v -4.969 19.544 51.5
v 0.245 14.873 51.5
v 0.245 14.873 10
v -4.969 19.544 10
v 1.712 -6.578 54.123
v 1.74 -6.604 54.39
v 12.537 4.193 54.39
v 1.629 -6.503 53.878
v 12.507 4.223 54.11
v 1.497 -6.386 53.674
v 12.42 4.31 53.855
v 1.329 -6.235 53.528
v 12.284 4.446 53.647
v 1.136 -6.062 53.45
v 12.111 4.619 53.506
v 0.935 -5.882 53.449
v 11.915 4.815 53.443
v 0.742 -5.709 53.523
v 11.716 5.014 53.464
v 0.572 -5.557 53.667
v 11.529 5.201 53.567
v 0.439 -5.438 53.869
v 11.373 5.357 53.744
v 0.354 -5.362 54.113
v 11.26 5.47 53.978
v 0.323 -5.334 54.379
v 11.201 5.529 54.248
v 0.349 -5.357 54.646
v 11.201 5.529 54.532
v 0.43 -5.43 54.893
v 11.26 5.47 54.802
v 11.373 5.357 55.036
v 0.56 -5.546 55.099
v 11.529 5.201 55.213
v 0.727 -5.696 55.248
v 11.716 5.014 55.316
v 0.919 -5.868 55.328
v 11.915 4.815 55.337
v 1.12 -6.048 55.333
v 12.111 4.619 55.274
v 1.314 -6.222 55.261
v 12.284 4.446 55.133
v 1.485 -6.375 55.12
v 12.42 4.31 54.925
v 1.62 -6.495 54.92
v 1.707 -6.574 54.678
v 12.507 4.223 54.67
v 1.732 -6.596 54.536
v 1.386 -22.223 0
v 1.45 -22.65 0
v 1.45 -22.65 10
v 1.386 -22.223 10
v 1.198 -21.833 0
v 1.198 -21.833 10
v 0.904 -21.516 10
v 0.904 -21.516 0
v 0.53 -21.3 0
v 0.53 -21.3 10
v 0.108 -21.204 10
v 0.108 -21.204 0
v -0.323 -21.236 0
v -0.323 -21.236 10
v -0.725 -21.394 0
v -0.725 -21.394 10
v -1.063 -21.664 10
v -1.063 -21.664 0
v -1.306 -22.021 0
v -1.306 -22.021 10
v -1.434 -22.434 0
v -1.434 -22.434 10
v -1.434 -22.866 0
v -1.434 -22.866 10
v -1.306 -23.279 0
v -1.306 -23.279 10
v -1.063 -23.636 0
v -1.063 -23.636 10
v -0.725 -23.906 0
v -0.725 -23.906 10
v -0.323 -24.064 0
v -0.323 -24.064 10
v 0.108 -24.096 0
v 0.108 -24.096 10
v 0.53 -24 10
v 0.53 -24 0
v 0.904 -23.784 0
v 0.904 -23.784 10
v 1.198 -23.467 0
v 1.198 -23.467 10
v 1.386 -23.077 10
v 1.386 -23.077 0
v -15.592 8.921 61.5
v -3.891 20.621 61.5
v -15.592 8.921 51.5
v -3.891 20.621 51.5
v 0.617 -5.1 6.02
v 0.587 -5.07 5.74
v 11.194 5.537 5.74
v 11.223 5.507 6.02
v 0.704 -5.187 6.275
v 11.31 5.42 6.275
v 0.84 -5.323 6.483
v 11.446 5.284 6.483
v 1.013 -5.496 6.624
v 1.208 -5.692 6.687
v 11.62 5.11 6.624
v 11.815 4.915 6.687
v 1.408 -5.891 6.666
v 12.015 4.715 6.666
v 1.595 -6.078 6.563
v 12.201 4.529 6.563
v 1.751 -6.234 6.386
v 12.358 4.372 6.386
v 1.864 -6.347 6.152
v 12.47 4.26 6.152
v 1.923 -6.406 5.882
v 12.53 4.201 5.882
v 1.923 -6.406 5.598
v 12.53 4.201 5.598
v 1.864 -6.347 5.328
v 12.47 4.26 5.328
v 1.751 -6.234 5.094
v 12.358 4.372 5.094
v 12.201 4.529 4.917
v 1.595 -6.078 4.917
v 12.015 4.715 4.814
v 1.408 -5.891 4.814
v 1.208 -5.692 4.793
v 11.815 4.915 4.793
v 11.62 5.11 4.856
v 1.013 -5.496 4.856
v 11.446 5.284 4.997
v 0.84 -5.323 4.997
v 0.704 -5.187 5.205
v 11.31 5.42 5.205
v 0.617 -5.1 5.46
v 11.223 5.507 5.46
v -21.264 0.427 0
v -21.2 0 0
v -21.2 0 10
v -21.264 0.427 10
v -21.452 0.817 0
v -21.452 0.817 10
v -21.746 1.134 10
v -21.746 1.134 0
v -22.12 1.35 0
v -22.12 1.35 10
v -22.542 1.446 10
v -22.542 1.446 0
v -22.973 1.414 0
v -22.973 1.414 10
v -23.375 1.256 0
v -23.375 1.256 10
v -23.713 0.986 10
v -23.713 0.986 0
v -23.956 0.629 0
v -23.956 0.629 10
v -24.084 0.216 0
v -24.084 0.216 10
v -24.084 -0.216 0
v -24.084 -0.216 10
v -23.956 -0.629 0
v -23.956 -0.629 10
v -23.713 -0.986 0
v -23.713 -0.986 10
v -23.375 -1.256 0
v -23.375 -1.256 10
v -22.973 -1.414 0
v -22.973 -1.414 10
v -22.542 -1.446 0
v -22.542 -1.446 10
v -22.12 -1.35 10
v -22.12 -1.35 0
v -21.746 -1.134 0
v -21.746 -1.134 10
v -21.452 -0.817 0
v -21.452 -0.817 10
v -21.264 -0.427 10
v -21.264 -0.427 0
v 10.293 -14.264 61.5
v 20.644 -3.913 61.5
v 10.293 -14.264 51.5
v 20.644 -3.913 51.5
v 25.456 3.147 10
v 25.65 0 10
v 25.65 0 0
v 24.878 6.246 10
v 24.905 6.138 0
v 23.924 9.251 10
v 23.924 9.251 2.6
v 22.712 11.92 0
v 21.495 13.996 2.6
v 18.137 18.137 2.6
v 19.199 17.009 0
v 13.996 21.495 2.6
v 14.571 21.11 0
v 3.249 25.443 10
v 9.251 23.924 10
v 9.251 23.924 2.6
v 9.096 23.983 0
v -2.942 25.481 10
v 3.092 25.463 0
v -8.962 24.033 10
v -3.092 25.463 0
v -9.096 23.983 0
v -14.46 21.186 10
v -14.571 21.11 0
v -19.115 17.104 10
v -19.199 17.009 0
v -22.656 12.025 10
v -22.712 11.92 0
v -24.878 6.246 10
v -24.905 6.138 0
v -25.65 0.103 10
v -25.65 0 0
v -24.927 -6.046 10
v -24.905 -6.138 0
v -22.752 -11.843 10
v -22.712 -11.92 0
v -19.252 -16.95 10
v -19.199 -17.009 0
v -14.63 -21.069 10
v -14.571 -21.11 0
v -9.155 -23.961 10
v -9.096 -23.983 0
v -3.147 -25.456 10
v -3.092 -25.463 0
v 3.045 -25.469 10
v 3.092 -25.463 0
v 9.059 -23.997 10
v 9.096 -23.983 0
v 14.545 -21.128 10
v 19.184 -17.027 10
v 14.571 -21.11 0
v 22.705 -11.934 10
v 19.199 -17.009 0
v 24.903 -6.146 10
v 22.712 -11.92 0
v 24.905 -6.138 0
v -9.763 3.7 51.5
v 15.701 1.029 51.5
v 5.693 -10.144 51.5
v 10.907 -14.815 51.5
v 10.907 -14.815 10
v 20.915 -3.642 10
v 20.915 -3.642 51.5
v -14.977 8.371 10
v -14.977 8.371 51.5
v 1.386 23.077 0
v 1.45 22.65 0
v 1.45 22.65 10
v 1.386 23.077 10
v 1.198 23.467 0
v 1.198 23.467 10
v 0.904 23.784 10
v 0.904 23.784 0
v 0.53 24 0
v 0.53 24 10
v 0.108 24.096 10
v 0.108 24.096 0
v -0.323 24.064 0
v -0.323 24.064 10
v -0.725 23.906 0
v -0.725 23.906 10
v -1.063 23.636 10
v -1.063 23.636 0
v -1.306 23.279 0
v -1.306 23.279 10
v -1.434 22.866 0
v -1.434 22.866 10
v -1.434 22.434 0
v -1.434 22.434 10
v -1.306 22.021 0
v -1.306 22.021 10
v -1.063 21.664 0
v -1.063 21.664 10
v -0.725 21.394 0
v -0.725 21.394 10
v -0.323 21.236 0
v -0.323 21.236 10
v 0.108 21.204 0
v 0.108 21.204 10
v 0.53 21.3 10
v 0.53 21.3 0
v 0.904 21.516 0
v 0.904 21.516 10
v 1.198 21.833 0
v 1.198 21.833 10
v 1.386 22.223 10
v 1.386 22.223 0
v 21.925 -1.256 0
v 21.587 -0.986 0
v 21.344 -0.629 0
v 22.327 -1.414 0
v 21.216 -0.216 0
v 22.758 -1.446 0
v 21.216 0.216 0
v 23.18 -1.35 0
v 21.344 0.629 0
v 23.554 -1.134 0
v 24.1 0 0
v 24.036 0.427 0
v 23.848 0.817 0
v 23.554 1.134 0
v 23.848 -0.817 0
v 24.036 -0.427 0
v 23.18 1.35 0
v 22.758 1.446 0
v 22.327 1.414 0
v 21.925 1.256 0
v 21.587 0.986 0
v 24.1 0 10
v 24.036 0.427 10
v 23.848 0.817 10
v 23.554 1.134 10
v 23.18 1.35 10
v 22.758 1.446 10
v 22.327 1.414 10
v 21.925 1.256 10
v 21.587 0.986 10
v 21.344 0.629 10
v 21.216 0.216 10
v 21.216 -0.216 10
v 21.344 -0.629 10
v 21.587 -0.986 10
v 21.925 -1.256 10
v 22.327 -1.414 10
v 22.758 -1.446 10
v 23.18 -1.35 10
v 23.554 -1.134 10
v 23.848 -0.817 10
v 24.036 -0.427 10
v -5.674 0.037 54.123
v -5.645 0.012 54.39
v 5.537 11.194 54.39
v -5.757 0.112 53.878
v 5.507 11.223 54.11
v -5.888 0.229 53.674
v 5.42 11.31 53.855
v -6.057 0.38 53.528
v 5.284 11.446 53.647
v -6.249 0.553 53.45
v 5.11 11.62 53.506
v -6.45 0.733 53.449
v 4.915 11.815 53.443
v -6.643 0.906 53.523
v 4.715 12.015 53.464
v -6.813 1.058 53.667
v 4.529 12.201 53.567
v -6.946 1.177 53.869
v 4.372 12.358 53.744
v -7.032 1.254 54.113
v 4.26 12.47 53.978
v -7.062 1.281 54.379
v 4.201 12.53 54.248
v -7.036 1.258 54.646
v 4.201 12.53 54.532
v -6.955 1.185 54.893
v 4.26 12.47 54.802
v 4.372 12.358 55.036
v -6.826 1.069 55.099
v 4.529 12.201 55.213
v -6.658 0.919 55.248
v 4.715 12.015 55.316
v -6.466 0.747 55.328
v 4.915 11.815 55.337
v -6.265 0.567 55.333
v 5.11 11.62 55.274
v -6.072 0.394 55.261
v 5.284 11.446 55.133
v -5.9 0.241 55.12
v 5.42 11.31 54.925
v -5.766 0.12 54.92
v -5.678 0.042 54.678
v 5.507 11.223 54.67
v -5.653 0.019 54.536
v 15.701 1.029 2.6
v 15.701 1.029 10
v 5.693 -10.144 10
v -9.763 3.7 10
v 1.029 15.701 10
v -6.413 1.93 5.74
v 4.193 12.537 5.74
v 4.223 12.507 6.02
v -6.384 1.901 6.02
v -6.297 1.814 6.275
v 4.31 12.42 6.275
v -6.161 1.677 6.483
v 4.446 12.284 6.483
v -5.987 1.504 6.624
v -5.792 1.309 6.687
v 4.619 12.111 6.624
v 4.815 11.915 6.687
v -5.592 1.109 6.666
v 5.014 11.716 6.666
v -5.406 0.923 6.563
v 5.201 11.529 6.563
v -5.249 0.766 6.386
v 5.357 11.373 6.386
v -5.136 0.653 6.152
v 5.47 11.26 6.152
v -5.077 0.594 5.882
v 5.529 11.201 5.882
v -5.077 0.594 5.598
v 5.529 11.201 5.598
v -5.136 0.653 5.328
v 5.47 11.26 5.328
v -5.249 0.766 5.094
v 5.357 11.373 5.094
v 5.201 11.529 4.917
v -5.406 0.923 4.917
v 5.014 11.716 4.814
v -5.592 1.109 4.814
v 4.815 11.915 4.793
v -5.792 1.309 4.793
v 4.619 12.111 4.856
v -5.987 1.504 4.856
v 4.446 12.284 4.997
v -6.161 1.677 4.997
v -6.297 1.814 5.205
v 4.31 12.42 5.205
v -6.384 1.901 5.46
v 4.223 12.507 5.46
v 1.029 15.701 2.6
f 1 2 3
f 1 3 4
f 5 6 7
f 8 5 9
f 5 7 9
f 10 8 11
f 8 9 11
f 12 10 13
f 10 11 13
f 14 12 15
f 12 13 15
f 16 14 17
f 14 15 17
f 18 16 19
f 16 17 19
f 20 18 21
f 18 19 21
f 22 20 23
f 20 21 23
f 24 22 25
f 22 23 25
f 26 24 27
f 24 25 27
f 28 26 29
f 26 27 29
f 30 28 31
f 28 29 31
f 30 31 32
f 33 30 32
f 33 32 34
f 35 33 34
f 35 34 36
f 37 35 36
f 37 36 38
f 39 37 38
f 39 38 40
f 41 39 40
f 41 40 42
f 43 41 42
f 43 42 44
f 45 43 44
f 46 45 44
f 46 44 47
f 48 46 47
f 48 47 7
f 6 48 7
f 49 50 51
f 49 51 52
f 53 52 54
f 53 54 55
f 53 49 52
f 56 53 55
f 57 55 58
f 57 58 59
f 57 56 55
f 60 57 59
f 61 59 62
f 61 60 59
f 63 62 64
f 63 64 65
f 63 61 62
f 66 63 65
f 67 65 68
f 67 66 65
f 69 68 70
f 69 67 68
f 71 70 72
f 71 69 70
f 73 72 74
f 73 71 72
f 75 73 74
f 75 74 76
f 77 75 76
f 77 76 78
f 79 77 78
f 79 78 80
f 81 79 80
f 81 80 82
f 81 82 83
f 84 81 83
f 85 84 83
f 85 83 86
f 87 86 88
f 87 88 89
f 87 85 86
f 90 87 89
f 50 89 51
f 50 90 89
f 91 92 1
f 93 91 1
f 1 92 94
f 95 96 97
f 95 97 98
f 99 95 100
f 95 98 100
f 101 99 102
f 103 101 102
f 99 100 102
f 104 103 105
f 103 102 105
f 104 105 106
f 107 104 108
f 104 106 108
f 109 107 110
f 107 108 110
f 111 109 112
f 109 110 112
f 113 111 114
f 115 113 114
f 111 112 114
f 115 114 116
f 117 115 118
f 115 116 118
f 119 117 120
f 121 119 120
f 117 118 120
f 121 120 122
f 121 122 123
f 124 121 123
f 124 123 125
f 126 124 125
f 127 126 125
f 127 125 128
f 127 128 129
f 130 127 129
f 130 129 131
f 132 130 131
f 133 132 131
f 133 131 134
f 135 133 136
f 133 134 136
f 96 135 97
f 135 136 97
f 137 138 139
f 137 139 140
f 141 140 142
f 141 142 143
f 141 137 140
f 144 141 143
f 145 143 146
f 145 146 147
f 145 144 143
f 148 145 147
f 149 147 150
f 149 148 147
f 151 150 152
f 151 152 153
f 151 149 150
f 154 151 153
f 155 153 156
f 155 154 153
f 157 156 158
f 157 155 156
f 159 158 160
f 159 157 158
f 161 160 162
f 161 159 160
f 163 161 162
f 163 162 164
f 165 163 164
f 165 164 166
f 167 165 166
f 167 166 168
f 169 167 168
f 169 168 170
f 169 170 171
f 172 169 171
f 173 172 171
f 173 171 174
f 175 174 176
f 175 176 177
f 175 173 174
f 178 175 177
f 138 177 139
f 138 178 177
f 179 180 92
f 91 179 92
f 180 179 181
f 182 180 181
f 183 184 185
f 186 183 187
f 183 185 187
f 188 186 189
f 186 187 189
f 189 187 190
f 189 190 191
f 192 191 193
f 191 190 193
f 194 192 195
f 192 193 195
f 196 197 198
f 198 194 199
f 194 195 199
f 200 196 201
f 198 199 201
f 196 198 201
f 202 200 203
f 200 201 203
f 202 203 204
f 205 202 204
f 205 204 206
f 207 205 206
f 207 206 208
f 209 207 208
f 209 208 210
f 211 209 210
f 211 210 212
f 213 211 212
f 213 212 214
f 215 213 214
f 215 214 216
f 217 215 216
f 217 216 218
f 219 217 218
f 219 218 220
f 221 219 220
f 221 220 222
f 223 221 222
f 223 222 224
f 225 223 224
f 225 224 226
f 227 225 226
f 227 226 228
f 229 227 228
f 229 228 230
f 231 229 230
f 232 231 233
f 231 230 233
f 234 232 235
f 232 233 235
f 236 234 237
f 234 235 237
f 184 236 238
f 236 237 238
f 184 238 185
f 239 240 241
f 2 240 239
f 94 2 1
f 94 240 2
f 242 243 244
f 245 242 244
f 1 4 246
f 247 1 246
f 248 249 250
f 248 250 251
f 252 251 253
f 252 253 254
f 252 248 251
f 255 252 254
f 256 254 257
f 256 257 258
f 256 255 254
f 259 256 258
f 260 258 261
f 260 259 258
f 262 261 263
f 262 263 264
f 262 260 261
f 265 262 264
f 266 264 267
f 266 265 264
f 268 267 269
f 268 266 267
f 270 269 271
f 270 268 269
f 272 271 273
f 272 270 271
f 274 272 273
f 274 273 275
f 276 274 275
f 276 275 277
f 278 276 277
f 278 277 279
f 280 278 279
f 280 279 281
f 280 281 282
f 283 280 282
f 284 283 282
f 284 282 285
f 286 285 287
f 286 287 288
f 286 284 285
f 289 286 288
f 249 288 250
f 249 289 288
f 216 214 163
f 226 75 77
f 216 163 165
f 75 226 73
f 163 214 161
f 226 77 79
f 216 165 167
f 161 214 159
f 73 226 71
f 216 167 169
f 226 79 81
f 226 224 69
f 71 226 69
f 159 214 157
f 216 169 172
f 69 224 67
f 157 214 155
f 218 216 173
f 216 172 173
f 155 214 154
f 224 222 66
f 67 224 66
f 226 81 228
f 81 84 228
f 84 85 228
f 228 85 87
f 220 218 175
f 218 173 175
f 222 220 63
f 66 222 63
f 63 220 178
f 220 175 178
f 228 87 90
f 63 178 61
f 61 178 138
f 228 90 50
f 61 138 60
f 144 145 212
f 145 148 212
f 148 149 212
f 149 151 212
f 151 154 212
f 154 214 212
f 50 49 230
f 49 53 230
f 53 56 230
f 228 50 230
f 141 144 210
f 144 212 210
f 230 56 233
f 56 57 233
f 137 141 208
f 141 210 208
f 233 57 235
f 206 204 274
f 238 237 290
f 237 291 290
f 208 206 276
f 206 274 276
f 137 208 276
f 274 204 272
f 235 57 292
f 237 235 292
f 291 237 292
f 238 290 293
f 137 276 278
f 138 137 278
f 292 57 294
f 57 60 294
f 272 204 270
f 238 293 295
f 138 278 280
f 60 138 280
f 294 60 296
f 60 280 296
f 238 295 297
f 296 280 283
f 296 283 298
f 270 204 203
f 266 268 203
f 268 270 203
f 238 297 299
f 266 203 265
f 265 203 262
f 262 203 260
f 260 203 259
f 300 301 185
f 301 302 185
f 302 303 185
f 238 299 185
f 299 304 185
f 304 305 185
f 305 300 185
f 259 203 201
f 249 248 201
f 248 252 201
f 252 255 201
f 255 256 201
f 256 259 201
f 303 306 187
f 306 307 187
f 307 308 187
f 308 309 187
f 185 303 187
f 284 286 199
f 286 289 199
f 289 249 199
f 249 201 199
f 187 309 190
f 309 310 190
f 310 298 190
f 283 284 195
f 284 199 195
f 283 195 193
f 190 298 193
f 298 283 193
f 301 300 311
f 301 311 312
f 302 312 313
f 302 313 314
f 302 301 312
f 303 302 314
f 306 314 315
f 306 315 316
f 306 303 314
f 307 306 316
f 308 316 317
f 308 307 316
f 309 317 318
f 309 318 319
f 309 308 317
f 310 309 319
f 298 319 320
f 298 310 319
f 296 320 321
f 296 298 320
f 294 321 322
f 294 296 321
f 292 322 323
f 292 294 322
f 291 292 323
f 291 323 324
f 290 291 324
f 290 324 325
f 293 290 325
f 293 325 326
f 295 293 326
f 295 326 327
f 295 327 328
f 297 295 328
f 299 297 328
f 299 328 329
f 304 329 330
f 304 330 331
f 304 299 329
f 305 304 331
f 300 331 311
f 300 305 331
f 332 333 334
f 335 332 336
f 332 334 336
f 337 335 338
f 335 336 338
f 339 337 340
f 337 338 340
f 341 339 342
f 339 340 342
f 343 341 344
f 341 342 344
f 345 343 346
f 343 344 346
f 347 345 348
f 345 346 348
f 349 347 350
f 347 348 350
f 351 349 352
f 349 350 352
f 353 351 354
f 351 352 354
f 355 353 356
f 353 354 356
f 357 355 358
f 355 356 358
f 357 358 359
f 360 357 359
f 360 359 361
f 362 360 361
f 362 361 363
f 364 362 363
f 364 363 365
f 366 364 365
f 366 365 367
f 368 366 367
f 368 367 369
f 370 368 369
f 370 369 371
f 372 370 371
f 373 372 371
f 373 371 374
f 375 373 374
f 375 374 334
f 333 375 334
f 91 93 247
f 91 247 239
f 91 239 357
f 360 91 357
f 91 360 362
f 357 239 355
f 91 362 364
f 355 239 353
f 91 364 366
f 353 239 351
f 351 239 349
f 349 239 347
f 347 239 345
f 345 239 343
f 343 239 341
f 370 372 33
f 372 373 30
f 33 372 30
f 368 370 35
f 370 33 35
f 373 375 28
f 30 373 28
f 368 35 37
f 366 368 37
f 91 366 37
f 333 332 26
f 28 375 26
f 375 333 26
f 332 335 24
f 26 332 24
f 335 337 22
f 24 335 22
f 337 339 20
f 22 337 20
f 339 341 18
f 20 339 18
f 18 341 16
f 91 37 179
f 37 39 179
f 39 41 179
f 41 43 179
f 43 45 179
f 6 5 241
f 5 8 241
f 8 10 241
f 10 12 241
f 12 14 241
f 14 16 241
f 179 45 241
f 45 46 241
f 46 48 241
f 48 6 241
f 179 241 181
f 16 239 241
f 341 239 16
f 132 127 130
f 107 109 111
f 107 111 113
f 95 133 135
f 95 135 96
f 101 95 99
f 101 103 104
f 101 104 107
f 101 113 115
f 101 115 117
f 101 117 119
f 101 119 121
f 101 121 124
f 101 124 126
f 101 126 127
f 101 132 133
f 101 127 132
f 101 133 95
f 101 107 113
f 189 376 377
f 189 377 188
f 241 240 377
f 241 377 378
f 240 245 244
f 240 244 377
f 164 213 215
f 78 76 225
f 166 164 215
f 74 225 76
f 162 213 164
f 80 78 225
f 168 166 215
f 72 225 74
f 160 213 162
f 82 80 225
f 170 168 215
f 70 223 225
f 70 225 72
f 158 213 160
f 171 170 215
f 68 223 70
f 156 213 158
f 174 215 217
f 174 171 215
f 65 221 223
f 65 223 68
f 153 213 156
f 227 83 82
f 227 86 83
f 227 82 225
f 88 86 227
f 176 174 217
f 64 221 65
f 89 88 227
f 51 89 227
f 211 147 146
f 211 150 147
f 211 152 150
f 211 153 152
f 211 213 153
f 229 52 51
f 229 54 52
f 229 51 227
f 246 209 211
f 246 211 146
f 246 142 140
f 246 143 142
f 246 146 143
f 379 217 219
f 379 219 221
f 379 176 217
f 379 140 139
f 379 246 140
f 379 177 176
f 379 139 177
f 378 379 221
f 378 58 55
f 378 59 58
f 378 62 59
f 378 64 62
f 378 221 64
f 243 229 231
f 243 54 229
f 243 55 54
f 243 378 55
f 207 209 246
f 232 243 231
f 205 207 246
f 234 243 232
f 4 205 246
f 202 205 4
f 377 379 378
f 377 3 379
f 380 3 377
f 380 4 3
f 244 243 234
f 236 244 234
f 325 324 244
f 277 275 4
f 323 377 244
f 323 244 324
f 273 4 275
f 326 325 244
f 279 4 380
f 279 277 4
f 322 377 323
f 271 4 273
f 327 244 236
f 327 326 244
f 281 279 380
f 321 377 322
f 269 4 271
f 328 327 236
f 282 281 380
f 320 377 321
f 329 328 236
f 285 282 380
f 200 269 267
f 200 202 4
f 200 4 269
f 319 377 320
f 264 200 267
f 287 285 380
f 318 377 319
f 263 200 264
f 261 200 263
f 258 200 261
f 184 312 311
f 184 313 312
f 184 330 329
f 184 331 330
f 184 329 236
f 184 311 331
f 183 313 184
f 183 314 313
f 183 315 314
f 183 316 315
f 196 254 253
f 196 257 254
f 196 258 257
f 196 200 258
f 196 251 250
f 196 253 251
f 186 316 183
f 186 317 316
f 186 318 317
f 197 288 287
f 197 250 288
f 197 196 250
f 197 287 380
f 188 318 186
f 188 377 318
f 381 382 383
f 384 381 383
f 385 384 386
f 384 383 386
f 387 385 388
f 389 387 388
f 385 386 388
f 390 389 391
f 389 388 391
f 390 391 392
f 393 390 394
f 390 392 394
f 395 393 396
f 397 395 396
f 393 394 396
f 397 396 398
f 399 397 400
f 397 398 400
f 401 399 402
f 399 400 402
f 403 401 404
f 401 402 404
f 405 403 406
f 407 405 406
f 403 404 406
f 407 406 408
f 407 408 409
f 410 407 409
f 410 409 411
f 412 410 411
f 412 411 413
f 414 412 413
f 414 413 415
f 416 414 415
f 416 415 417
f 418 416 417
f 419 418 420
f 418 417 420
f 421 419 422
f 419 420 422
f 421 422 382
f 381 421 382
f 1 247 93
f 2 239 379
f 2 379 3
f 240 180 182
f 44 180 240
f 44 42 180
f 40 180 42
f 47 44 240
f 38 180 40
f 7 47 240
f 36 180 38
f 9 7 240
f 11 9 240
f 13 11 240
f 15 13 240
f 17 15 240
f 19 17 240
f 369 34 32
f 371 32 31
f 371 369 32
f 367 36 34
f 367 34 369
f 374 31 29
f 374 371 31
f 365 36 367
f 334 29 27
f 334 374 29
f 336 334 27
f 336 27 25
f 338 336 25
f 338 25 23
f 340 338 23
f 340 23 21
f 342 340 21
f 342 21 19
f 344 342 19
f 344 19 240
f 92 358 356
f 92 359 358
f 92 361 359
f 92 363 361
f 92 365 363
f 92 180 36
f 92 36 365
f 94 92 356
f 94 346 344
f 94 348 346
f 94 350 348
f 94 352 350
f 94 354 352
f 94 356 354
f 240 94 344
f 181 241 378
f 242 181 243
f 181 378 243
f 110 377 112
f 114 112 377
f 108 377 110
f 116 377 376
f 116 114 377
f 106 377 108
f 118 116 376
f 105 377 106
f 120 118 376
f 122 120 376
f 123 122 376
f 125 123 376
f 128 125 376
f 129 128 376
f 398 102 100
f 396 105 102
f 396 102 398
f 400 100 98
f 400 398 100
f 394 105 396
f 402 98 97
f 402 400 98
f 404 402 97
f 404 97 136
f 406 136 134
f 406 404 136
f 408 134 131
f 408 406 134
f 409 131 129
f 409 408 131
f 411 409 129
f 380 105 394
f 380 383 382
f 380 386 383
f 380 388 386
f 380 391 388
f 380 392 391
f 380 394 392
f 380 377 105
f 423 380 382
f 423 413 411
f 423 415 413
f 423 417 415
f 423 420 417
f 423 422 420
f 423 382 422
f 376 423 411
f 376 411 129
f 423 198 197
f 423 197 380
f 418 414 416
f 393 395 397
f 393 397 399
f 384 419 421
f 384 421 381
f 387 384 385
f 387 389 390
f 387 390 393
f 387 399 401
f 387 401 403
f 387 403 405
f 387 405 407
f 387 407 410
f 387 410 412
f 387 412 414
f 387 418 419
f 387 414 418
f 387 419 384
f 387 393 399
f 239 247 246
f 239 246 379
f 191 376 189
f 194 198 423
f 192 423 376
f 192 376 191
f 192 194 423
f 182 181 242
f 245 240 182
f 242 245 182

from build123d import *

# Parameters (mm, degrees)
SKETCH1_R               = 25.65
SKETCH1_R_2             = 1.45
BOSS_EXTRUDE1_DEPTH     = 10
CUT_EXTRUDE2_DEPTH      = 38.627715849
CUT_EXTRUDE2_DEPTH_BACK = 7.4
SKETCH3_R               = 0.95
CUT_EXTRUDE3_DEPTH      = 10
BOSS_EXTRUDE2_DEPTH     = 41.5
BOSS_EXTRUDE3_REACH     = 72.472
SKETCH7_R               = 0.95
SKETCH7_W               = 10
SKETCH7_H               = 34.697559569
SKETCH11_R              = 0.95
CUT_EXTRUDE4_DEPTH      = 15


with BuildPart() as part:
    # Sketch1 → Boss-Extrude1 (new body)
    with BuildSketch(Plane.XY):
        Circle(SKETCH1_R)
        with Locations((0, -22.65)):
            Circle(SKETCH1_R_2, mode=Mode.SUBTRACT)
        with Locations((22.65, 0)):
            Circle(SKETCH1_R_2, mode=Mode.SUBTRACT)
        with Locations((0, 22.65)):
            Circle(SKETCH1_R_2, mode=Mode.SUBTRACT)
        with Locations((-22.65, 0)):
            Circle(SKETCH1_R_2, mode=Mode.SUBTRACT)
    extrude(amount=BOSS_EXTRUDE1_DEPTH)

    # Sketch2 → Cut-Extrude2 (cut, two sides: drawn at the far end of the back side and taken through both)
    with BuildSketch(Plane.XY.offset(10).offset(-CUT_EXTRUDE2_DEPTH_BACK)):
        Polygon((102.061719716, 116.734185426), (9.251139978, 23.923605688), (1.028840367, 15.701306076), (15.701306076, 1.028840367), (23.923605688, 9.251139978), (116.734185426, 102.061719716), (302.355344902, 287.682879192), (287.682879192, 302.355344902), align=None)
    extrude(amount=CUT_EXTRUDE2_DEPTH + CUT_EXTRUDE2_DEPTH_BACK, mode=Mode.SUBTRACT)

    # Sketch3 → Cut-Extrude3 (cut)
    with BuildSketch(Plane(origin=(8.365073221, 8.365073221, 0), x_dir=(0, 0, -1), z_dir=(0.7071067811865477, 0.7071067811865475, 0))):
        with Locations(Location((-5.74, 4.95, 0), (0, 0, 90))):
            Circle(SKETCH3_R)
        with Locations(Location((-5.74, -4.95, 0), (0, 0, 270))):
            Circle(SKETCH3_R)
    extrude(amount=-CUT_EXTRUDE3_DEPTH, mode=Mode.SUBTRACT)

    # Sketch5 → Boss-Extrude2 (add)
    with BuildSketch(Plane.XY.offset(10)):
        Polygon((15.701306076, 1.028840367), (5.693193293, -10.144237926), (10.907296496, -14.814690558), (20.915409279, -3.641612265), align=None)
        Polygon((0.245214439, 14.873396383), (-4.968888764, 19.543849015), (-14.977001547, 8.370770723), (-9.762898344, 3.700318091), align=None)
    extrude(amount=BOSS_EXTRUDE2_DEPTH)

    # Boss-Extrude3: up to this plane
    boss_extrude3_end = Plane(origin=(5.693193293, -10.144237926, 51.5), z_dir=(0.6672075188676077, 0.7448718861432019, 0))
    # Sketch7 → Boss-Extrude3 (add, up to the surface)
    with BuildSketch(Plane(origin=(8.365073221, 8.365073221, 0), x_dir=(0, 0, -1), z_dir=(0.7071067811865477, 0.7071067811865475, 0)), mode=Mode.PRIVATE) as boss_extrude3_sk1:
        with Locations((-5.74, -4.95)):
            Circle(SKETCH7_R)
    boss_extrude3_tool1 = split(extrude(boss_extrude3_sk1.sketch, amount=-BOSS_EXTRUDE3_REACH, mode=Mode.PRIVATE), bisect_by=boss_extrude3_end, keep=Keep.BOTH, mode=Mode.PRIVATE)
    add(boss_extrude3_tool1.solids().sort_by_distance((11.865252, 4.864895, 5.74))[0])
    # Sketch7 → Boss-Extrude3 (add, up to the surface)
    with BuildSketch(Plane(origin=(8.365073221, 8.365073221, 0), x_dir=(0, 0, -1), z_dir=(0.7071067811865477, 0.7071067811865475, 0)), mode=Mode.PRIVATE) as boss_extrude3_sk2:
        with Locations((-5.74, 4.95)):
            Circle(SKETCH7_R)
    boss_extrude3_tool2 = split(extrude(boss_extrude3_sk2.sketch, amount=-BOSS_EXTRUDE3_REACH, mode=Mode.PRIVATE), bisect_by=boss_extrude3_end, keep=Keep.BOTH, mode=Mode.PRIVATE)
    add(boss_extrude3_tool2.solids().sort_by_distance((4.864895, 11.865252, 5.74))[0])
    # Sketch7 → Boss-Extrude3 (add, up to the surface)
    with BuildSketch(Plane(origin=(8.365073221, 8.365073221, 0), x_dir=(0, 0, -1), z_dir=(0.7071067811865477, 0.7071067811865475, 0)), mode=Mode.PRIVATE) as boss_extrude3_sk3:
        with Locations((-56.5, -0.015656675)):
            Rectangle(SKETCH7_W, SKETCH7_H)
        with Locations(Location((-54.39, -4.95, 0), (0, 0, 270))):
            Circle(SKETCH7_R, mode=Mode.SUBTRACT)
        with Locations(Location((-54.39, 4.95, 0), (0, 0, 270))):
            Circle(SKETCH7_R, mode=Mode.SUBTRACT)
    boss_extrude3_tool3 = split(extrude(boss_extrude3_sk3.sketch, amount=-BOSS_EXTRUDE3_REACH, mode=Mode.PRIVATE), bisect_by=boss_extrude3_end, keep=Keep.BOTH, mode=Mode.PRIVATE)
    add(boss_extrude3_tool3.solids().sort_by_distance((8.376328, 8.353818, 56.535056))[0])

    # Sketch11 → Cut-Extrude4 (cut)
    with BuildSketch(Plane(origin=(8.365073221, 8.365073221, 0), x_dir=(0, 0, -1), z_dir=(0.7071067811865477, 0.7071067811865475, 0))):
        with Locations(Location((-5.74, -4.95, 0), (0, 0, 90))):
            Circle(SKETCH11_R)
        with Locations(Location((-5.74, 4.95, 0), (0, 0, 90))):
            Circle(SKETCH11_R)
    extrude(amount=-CUT_EXTRUDE4_DEPTH, mode=Mode.SUBTRACT)


solid = part.part
